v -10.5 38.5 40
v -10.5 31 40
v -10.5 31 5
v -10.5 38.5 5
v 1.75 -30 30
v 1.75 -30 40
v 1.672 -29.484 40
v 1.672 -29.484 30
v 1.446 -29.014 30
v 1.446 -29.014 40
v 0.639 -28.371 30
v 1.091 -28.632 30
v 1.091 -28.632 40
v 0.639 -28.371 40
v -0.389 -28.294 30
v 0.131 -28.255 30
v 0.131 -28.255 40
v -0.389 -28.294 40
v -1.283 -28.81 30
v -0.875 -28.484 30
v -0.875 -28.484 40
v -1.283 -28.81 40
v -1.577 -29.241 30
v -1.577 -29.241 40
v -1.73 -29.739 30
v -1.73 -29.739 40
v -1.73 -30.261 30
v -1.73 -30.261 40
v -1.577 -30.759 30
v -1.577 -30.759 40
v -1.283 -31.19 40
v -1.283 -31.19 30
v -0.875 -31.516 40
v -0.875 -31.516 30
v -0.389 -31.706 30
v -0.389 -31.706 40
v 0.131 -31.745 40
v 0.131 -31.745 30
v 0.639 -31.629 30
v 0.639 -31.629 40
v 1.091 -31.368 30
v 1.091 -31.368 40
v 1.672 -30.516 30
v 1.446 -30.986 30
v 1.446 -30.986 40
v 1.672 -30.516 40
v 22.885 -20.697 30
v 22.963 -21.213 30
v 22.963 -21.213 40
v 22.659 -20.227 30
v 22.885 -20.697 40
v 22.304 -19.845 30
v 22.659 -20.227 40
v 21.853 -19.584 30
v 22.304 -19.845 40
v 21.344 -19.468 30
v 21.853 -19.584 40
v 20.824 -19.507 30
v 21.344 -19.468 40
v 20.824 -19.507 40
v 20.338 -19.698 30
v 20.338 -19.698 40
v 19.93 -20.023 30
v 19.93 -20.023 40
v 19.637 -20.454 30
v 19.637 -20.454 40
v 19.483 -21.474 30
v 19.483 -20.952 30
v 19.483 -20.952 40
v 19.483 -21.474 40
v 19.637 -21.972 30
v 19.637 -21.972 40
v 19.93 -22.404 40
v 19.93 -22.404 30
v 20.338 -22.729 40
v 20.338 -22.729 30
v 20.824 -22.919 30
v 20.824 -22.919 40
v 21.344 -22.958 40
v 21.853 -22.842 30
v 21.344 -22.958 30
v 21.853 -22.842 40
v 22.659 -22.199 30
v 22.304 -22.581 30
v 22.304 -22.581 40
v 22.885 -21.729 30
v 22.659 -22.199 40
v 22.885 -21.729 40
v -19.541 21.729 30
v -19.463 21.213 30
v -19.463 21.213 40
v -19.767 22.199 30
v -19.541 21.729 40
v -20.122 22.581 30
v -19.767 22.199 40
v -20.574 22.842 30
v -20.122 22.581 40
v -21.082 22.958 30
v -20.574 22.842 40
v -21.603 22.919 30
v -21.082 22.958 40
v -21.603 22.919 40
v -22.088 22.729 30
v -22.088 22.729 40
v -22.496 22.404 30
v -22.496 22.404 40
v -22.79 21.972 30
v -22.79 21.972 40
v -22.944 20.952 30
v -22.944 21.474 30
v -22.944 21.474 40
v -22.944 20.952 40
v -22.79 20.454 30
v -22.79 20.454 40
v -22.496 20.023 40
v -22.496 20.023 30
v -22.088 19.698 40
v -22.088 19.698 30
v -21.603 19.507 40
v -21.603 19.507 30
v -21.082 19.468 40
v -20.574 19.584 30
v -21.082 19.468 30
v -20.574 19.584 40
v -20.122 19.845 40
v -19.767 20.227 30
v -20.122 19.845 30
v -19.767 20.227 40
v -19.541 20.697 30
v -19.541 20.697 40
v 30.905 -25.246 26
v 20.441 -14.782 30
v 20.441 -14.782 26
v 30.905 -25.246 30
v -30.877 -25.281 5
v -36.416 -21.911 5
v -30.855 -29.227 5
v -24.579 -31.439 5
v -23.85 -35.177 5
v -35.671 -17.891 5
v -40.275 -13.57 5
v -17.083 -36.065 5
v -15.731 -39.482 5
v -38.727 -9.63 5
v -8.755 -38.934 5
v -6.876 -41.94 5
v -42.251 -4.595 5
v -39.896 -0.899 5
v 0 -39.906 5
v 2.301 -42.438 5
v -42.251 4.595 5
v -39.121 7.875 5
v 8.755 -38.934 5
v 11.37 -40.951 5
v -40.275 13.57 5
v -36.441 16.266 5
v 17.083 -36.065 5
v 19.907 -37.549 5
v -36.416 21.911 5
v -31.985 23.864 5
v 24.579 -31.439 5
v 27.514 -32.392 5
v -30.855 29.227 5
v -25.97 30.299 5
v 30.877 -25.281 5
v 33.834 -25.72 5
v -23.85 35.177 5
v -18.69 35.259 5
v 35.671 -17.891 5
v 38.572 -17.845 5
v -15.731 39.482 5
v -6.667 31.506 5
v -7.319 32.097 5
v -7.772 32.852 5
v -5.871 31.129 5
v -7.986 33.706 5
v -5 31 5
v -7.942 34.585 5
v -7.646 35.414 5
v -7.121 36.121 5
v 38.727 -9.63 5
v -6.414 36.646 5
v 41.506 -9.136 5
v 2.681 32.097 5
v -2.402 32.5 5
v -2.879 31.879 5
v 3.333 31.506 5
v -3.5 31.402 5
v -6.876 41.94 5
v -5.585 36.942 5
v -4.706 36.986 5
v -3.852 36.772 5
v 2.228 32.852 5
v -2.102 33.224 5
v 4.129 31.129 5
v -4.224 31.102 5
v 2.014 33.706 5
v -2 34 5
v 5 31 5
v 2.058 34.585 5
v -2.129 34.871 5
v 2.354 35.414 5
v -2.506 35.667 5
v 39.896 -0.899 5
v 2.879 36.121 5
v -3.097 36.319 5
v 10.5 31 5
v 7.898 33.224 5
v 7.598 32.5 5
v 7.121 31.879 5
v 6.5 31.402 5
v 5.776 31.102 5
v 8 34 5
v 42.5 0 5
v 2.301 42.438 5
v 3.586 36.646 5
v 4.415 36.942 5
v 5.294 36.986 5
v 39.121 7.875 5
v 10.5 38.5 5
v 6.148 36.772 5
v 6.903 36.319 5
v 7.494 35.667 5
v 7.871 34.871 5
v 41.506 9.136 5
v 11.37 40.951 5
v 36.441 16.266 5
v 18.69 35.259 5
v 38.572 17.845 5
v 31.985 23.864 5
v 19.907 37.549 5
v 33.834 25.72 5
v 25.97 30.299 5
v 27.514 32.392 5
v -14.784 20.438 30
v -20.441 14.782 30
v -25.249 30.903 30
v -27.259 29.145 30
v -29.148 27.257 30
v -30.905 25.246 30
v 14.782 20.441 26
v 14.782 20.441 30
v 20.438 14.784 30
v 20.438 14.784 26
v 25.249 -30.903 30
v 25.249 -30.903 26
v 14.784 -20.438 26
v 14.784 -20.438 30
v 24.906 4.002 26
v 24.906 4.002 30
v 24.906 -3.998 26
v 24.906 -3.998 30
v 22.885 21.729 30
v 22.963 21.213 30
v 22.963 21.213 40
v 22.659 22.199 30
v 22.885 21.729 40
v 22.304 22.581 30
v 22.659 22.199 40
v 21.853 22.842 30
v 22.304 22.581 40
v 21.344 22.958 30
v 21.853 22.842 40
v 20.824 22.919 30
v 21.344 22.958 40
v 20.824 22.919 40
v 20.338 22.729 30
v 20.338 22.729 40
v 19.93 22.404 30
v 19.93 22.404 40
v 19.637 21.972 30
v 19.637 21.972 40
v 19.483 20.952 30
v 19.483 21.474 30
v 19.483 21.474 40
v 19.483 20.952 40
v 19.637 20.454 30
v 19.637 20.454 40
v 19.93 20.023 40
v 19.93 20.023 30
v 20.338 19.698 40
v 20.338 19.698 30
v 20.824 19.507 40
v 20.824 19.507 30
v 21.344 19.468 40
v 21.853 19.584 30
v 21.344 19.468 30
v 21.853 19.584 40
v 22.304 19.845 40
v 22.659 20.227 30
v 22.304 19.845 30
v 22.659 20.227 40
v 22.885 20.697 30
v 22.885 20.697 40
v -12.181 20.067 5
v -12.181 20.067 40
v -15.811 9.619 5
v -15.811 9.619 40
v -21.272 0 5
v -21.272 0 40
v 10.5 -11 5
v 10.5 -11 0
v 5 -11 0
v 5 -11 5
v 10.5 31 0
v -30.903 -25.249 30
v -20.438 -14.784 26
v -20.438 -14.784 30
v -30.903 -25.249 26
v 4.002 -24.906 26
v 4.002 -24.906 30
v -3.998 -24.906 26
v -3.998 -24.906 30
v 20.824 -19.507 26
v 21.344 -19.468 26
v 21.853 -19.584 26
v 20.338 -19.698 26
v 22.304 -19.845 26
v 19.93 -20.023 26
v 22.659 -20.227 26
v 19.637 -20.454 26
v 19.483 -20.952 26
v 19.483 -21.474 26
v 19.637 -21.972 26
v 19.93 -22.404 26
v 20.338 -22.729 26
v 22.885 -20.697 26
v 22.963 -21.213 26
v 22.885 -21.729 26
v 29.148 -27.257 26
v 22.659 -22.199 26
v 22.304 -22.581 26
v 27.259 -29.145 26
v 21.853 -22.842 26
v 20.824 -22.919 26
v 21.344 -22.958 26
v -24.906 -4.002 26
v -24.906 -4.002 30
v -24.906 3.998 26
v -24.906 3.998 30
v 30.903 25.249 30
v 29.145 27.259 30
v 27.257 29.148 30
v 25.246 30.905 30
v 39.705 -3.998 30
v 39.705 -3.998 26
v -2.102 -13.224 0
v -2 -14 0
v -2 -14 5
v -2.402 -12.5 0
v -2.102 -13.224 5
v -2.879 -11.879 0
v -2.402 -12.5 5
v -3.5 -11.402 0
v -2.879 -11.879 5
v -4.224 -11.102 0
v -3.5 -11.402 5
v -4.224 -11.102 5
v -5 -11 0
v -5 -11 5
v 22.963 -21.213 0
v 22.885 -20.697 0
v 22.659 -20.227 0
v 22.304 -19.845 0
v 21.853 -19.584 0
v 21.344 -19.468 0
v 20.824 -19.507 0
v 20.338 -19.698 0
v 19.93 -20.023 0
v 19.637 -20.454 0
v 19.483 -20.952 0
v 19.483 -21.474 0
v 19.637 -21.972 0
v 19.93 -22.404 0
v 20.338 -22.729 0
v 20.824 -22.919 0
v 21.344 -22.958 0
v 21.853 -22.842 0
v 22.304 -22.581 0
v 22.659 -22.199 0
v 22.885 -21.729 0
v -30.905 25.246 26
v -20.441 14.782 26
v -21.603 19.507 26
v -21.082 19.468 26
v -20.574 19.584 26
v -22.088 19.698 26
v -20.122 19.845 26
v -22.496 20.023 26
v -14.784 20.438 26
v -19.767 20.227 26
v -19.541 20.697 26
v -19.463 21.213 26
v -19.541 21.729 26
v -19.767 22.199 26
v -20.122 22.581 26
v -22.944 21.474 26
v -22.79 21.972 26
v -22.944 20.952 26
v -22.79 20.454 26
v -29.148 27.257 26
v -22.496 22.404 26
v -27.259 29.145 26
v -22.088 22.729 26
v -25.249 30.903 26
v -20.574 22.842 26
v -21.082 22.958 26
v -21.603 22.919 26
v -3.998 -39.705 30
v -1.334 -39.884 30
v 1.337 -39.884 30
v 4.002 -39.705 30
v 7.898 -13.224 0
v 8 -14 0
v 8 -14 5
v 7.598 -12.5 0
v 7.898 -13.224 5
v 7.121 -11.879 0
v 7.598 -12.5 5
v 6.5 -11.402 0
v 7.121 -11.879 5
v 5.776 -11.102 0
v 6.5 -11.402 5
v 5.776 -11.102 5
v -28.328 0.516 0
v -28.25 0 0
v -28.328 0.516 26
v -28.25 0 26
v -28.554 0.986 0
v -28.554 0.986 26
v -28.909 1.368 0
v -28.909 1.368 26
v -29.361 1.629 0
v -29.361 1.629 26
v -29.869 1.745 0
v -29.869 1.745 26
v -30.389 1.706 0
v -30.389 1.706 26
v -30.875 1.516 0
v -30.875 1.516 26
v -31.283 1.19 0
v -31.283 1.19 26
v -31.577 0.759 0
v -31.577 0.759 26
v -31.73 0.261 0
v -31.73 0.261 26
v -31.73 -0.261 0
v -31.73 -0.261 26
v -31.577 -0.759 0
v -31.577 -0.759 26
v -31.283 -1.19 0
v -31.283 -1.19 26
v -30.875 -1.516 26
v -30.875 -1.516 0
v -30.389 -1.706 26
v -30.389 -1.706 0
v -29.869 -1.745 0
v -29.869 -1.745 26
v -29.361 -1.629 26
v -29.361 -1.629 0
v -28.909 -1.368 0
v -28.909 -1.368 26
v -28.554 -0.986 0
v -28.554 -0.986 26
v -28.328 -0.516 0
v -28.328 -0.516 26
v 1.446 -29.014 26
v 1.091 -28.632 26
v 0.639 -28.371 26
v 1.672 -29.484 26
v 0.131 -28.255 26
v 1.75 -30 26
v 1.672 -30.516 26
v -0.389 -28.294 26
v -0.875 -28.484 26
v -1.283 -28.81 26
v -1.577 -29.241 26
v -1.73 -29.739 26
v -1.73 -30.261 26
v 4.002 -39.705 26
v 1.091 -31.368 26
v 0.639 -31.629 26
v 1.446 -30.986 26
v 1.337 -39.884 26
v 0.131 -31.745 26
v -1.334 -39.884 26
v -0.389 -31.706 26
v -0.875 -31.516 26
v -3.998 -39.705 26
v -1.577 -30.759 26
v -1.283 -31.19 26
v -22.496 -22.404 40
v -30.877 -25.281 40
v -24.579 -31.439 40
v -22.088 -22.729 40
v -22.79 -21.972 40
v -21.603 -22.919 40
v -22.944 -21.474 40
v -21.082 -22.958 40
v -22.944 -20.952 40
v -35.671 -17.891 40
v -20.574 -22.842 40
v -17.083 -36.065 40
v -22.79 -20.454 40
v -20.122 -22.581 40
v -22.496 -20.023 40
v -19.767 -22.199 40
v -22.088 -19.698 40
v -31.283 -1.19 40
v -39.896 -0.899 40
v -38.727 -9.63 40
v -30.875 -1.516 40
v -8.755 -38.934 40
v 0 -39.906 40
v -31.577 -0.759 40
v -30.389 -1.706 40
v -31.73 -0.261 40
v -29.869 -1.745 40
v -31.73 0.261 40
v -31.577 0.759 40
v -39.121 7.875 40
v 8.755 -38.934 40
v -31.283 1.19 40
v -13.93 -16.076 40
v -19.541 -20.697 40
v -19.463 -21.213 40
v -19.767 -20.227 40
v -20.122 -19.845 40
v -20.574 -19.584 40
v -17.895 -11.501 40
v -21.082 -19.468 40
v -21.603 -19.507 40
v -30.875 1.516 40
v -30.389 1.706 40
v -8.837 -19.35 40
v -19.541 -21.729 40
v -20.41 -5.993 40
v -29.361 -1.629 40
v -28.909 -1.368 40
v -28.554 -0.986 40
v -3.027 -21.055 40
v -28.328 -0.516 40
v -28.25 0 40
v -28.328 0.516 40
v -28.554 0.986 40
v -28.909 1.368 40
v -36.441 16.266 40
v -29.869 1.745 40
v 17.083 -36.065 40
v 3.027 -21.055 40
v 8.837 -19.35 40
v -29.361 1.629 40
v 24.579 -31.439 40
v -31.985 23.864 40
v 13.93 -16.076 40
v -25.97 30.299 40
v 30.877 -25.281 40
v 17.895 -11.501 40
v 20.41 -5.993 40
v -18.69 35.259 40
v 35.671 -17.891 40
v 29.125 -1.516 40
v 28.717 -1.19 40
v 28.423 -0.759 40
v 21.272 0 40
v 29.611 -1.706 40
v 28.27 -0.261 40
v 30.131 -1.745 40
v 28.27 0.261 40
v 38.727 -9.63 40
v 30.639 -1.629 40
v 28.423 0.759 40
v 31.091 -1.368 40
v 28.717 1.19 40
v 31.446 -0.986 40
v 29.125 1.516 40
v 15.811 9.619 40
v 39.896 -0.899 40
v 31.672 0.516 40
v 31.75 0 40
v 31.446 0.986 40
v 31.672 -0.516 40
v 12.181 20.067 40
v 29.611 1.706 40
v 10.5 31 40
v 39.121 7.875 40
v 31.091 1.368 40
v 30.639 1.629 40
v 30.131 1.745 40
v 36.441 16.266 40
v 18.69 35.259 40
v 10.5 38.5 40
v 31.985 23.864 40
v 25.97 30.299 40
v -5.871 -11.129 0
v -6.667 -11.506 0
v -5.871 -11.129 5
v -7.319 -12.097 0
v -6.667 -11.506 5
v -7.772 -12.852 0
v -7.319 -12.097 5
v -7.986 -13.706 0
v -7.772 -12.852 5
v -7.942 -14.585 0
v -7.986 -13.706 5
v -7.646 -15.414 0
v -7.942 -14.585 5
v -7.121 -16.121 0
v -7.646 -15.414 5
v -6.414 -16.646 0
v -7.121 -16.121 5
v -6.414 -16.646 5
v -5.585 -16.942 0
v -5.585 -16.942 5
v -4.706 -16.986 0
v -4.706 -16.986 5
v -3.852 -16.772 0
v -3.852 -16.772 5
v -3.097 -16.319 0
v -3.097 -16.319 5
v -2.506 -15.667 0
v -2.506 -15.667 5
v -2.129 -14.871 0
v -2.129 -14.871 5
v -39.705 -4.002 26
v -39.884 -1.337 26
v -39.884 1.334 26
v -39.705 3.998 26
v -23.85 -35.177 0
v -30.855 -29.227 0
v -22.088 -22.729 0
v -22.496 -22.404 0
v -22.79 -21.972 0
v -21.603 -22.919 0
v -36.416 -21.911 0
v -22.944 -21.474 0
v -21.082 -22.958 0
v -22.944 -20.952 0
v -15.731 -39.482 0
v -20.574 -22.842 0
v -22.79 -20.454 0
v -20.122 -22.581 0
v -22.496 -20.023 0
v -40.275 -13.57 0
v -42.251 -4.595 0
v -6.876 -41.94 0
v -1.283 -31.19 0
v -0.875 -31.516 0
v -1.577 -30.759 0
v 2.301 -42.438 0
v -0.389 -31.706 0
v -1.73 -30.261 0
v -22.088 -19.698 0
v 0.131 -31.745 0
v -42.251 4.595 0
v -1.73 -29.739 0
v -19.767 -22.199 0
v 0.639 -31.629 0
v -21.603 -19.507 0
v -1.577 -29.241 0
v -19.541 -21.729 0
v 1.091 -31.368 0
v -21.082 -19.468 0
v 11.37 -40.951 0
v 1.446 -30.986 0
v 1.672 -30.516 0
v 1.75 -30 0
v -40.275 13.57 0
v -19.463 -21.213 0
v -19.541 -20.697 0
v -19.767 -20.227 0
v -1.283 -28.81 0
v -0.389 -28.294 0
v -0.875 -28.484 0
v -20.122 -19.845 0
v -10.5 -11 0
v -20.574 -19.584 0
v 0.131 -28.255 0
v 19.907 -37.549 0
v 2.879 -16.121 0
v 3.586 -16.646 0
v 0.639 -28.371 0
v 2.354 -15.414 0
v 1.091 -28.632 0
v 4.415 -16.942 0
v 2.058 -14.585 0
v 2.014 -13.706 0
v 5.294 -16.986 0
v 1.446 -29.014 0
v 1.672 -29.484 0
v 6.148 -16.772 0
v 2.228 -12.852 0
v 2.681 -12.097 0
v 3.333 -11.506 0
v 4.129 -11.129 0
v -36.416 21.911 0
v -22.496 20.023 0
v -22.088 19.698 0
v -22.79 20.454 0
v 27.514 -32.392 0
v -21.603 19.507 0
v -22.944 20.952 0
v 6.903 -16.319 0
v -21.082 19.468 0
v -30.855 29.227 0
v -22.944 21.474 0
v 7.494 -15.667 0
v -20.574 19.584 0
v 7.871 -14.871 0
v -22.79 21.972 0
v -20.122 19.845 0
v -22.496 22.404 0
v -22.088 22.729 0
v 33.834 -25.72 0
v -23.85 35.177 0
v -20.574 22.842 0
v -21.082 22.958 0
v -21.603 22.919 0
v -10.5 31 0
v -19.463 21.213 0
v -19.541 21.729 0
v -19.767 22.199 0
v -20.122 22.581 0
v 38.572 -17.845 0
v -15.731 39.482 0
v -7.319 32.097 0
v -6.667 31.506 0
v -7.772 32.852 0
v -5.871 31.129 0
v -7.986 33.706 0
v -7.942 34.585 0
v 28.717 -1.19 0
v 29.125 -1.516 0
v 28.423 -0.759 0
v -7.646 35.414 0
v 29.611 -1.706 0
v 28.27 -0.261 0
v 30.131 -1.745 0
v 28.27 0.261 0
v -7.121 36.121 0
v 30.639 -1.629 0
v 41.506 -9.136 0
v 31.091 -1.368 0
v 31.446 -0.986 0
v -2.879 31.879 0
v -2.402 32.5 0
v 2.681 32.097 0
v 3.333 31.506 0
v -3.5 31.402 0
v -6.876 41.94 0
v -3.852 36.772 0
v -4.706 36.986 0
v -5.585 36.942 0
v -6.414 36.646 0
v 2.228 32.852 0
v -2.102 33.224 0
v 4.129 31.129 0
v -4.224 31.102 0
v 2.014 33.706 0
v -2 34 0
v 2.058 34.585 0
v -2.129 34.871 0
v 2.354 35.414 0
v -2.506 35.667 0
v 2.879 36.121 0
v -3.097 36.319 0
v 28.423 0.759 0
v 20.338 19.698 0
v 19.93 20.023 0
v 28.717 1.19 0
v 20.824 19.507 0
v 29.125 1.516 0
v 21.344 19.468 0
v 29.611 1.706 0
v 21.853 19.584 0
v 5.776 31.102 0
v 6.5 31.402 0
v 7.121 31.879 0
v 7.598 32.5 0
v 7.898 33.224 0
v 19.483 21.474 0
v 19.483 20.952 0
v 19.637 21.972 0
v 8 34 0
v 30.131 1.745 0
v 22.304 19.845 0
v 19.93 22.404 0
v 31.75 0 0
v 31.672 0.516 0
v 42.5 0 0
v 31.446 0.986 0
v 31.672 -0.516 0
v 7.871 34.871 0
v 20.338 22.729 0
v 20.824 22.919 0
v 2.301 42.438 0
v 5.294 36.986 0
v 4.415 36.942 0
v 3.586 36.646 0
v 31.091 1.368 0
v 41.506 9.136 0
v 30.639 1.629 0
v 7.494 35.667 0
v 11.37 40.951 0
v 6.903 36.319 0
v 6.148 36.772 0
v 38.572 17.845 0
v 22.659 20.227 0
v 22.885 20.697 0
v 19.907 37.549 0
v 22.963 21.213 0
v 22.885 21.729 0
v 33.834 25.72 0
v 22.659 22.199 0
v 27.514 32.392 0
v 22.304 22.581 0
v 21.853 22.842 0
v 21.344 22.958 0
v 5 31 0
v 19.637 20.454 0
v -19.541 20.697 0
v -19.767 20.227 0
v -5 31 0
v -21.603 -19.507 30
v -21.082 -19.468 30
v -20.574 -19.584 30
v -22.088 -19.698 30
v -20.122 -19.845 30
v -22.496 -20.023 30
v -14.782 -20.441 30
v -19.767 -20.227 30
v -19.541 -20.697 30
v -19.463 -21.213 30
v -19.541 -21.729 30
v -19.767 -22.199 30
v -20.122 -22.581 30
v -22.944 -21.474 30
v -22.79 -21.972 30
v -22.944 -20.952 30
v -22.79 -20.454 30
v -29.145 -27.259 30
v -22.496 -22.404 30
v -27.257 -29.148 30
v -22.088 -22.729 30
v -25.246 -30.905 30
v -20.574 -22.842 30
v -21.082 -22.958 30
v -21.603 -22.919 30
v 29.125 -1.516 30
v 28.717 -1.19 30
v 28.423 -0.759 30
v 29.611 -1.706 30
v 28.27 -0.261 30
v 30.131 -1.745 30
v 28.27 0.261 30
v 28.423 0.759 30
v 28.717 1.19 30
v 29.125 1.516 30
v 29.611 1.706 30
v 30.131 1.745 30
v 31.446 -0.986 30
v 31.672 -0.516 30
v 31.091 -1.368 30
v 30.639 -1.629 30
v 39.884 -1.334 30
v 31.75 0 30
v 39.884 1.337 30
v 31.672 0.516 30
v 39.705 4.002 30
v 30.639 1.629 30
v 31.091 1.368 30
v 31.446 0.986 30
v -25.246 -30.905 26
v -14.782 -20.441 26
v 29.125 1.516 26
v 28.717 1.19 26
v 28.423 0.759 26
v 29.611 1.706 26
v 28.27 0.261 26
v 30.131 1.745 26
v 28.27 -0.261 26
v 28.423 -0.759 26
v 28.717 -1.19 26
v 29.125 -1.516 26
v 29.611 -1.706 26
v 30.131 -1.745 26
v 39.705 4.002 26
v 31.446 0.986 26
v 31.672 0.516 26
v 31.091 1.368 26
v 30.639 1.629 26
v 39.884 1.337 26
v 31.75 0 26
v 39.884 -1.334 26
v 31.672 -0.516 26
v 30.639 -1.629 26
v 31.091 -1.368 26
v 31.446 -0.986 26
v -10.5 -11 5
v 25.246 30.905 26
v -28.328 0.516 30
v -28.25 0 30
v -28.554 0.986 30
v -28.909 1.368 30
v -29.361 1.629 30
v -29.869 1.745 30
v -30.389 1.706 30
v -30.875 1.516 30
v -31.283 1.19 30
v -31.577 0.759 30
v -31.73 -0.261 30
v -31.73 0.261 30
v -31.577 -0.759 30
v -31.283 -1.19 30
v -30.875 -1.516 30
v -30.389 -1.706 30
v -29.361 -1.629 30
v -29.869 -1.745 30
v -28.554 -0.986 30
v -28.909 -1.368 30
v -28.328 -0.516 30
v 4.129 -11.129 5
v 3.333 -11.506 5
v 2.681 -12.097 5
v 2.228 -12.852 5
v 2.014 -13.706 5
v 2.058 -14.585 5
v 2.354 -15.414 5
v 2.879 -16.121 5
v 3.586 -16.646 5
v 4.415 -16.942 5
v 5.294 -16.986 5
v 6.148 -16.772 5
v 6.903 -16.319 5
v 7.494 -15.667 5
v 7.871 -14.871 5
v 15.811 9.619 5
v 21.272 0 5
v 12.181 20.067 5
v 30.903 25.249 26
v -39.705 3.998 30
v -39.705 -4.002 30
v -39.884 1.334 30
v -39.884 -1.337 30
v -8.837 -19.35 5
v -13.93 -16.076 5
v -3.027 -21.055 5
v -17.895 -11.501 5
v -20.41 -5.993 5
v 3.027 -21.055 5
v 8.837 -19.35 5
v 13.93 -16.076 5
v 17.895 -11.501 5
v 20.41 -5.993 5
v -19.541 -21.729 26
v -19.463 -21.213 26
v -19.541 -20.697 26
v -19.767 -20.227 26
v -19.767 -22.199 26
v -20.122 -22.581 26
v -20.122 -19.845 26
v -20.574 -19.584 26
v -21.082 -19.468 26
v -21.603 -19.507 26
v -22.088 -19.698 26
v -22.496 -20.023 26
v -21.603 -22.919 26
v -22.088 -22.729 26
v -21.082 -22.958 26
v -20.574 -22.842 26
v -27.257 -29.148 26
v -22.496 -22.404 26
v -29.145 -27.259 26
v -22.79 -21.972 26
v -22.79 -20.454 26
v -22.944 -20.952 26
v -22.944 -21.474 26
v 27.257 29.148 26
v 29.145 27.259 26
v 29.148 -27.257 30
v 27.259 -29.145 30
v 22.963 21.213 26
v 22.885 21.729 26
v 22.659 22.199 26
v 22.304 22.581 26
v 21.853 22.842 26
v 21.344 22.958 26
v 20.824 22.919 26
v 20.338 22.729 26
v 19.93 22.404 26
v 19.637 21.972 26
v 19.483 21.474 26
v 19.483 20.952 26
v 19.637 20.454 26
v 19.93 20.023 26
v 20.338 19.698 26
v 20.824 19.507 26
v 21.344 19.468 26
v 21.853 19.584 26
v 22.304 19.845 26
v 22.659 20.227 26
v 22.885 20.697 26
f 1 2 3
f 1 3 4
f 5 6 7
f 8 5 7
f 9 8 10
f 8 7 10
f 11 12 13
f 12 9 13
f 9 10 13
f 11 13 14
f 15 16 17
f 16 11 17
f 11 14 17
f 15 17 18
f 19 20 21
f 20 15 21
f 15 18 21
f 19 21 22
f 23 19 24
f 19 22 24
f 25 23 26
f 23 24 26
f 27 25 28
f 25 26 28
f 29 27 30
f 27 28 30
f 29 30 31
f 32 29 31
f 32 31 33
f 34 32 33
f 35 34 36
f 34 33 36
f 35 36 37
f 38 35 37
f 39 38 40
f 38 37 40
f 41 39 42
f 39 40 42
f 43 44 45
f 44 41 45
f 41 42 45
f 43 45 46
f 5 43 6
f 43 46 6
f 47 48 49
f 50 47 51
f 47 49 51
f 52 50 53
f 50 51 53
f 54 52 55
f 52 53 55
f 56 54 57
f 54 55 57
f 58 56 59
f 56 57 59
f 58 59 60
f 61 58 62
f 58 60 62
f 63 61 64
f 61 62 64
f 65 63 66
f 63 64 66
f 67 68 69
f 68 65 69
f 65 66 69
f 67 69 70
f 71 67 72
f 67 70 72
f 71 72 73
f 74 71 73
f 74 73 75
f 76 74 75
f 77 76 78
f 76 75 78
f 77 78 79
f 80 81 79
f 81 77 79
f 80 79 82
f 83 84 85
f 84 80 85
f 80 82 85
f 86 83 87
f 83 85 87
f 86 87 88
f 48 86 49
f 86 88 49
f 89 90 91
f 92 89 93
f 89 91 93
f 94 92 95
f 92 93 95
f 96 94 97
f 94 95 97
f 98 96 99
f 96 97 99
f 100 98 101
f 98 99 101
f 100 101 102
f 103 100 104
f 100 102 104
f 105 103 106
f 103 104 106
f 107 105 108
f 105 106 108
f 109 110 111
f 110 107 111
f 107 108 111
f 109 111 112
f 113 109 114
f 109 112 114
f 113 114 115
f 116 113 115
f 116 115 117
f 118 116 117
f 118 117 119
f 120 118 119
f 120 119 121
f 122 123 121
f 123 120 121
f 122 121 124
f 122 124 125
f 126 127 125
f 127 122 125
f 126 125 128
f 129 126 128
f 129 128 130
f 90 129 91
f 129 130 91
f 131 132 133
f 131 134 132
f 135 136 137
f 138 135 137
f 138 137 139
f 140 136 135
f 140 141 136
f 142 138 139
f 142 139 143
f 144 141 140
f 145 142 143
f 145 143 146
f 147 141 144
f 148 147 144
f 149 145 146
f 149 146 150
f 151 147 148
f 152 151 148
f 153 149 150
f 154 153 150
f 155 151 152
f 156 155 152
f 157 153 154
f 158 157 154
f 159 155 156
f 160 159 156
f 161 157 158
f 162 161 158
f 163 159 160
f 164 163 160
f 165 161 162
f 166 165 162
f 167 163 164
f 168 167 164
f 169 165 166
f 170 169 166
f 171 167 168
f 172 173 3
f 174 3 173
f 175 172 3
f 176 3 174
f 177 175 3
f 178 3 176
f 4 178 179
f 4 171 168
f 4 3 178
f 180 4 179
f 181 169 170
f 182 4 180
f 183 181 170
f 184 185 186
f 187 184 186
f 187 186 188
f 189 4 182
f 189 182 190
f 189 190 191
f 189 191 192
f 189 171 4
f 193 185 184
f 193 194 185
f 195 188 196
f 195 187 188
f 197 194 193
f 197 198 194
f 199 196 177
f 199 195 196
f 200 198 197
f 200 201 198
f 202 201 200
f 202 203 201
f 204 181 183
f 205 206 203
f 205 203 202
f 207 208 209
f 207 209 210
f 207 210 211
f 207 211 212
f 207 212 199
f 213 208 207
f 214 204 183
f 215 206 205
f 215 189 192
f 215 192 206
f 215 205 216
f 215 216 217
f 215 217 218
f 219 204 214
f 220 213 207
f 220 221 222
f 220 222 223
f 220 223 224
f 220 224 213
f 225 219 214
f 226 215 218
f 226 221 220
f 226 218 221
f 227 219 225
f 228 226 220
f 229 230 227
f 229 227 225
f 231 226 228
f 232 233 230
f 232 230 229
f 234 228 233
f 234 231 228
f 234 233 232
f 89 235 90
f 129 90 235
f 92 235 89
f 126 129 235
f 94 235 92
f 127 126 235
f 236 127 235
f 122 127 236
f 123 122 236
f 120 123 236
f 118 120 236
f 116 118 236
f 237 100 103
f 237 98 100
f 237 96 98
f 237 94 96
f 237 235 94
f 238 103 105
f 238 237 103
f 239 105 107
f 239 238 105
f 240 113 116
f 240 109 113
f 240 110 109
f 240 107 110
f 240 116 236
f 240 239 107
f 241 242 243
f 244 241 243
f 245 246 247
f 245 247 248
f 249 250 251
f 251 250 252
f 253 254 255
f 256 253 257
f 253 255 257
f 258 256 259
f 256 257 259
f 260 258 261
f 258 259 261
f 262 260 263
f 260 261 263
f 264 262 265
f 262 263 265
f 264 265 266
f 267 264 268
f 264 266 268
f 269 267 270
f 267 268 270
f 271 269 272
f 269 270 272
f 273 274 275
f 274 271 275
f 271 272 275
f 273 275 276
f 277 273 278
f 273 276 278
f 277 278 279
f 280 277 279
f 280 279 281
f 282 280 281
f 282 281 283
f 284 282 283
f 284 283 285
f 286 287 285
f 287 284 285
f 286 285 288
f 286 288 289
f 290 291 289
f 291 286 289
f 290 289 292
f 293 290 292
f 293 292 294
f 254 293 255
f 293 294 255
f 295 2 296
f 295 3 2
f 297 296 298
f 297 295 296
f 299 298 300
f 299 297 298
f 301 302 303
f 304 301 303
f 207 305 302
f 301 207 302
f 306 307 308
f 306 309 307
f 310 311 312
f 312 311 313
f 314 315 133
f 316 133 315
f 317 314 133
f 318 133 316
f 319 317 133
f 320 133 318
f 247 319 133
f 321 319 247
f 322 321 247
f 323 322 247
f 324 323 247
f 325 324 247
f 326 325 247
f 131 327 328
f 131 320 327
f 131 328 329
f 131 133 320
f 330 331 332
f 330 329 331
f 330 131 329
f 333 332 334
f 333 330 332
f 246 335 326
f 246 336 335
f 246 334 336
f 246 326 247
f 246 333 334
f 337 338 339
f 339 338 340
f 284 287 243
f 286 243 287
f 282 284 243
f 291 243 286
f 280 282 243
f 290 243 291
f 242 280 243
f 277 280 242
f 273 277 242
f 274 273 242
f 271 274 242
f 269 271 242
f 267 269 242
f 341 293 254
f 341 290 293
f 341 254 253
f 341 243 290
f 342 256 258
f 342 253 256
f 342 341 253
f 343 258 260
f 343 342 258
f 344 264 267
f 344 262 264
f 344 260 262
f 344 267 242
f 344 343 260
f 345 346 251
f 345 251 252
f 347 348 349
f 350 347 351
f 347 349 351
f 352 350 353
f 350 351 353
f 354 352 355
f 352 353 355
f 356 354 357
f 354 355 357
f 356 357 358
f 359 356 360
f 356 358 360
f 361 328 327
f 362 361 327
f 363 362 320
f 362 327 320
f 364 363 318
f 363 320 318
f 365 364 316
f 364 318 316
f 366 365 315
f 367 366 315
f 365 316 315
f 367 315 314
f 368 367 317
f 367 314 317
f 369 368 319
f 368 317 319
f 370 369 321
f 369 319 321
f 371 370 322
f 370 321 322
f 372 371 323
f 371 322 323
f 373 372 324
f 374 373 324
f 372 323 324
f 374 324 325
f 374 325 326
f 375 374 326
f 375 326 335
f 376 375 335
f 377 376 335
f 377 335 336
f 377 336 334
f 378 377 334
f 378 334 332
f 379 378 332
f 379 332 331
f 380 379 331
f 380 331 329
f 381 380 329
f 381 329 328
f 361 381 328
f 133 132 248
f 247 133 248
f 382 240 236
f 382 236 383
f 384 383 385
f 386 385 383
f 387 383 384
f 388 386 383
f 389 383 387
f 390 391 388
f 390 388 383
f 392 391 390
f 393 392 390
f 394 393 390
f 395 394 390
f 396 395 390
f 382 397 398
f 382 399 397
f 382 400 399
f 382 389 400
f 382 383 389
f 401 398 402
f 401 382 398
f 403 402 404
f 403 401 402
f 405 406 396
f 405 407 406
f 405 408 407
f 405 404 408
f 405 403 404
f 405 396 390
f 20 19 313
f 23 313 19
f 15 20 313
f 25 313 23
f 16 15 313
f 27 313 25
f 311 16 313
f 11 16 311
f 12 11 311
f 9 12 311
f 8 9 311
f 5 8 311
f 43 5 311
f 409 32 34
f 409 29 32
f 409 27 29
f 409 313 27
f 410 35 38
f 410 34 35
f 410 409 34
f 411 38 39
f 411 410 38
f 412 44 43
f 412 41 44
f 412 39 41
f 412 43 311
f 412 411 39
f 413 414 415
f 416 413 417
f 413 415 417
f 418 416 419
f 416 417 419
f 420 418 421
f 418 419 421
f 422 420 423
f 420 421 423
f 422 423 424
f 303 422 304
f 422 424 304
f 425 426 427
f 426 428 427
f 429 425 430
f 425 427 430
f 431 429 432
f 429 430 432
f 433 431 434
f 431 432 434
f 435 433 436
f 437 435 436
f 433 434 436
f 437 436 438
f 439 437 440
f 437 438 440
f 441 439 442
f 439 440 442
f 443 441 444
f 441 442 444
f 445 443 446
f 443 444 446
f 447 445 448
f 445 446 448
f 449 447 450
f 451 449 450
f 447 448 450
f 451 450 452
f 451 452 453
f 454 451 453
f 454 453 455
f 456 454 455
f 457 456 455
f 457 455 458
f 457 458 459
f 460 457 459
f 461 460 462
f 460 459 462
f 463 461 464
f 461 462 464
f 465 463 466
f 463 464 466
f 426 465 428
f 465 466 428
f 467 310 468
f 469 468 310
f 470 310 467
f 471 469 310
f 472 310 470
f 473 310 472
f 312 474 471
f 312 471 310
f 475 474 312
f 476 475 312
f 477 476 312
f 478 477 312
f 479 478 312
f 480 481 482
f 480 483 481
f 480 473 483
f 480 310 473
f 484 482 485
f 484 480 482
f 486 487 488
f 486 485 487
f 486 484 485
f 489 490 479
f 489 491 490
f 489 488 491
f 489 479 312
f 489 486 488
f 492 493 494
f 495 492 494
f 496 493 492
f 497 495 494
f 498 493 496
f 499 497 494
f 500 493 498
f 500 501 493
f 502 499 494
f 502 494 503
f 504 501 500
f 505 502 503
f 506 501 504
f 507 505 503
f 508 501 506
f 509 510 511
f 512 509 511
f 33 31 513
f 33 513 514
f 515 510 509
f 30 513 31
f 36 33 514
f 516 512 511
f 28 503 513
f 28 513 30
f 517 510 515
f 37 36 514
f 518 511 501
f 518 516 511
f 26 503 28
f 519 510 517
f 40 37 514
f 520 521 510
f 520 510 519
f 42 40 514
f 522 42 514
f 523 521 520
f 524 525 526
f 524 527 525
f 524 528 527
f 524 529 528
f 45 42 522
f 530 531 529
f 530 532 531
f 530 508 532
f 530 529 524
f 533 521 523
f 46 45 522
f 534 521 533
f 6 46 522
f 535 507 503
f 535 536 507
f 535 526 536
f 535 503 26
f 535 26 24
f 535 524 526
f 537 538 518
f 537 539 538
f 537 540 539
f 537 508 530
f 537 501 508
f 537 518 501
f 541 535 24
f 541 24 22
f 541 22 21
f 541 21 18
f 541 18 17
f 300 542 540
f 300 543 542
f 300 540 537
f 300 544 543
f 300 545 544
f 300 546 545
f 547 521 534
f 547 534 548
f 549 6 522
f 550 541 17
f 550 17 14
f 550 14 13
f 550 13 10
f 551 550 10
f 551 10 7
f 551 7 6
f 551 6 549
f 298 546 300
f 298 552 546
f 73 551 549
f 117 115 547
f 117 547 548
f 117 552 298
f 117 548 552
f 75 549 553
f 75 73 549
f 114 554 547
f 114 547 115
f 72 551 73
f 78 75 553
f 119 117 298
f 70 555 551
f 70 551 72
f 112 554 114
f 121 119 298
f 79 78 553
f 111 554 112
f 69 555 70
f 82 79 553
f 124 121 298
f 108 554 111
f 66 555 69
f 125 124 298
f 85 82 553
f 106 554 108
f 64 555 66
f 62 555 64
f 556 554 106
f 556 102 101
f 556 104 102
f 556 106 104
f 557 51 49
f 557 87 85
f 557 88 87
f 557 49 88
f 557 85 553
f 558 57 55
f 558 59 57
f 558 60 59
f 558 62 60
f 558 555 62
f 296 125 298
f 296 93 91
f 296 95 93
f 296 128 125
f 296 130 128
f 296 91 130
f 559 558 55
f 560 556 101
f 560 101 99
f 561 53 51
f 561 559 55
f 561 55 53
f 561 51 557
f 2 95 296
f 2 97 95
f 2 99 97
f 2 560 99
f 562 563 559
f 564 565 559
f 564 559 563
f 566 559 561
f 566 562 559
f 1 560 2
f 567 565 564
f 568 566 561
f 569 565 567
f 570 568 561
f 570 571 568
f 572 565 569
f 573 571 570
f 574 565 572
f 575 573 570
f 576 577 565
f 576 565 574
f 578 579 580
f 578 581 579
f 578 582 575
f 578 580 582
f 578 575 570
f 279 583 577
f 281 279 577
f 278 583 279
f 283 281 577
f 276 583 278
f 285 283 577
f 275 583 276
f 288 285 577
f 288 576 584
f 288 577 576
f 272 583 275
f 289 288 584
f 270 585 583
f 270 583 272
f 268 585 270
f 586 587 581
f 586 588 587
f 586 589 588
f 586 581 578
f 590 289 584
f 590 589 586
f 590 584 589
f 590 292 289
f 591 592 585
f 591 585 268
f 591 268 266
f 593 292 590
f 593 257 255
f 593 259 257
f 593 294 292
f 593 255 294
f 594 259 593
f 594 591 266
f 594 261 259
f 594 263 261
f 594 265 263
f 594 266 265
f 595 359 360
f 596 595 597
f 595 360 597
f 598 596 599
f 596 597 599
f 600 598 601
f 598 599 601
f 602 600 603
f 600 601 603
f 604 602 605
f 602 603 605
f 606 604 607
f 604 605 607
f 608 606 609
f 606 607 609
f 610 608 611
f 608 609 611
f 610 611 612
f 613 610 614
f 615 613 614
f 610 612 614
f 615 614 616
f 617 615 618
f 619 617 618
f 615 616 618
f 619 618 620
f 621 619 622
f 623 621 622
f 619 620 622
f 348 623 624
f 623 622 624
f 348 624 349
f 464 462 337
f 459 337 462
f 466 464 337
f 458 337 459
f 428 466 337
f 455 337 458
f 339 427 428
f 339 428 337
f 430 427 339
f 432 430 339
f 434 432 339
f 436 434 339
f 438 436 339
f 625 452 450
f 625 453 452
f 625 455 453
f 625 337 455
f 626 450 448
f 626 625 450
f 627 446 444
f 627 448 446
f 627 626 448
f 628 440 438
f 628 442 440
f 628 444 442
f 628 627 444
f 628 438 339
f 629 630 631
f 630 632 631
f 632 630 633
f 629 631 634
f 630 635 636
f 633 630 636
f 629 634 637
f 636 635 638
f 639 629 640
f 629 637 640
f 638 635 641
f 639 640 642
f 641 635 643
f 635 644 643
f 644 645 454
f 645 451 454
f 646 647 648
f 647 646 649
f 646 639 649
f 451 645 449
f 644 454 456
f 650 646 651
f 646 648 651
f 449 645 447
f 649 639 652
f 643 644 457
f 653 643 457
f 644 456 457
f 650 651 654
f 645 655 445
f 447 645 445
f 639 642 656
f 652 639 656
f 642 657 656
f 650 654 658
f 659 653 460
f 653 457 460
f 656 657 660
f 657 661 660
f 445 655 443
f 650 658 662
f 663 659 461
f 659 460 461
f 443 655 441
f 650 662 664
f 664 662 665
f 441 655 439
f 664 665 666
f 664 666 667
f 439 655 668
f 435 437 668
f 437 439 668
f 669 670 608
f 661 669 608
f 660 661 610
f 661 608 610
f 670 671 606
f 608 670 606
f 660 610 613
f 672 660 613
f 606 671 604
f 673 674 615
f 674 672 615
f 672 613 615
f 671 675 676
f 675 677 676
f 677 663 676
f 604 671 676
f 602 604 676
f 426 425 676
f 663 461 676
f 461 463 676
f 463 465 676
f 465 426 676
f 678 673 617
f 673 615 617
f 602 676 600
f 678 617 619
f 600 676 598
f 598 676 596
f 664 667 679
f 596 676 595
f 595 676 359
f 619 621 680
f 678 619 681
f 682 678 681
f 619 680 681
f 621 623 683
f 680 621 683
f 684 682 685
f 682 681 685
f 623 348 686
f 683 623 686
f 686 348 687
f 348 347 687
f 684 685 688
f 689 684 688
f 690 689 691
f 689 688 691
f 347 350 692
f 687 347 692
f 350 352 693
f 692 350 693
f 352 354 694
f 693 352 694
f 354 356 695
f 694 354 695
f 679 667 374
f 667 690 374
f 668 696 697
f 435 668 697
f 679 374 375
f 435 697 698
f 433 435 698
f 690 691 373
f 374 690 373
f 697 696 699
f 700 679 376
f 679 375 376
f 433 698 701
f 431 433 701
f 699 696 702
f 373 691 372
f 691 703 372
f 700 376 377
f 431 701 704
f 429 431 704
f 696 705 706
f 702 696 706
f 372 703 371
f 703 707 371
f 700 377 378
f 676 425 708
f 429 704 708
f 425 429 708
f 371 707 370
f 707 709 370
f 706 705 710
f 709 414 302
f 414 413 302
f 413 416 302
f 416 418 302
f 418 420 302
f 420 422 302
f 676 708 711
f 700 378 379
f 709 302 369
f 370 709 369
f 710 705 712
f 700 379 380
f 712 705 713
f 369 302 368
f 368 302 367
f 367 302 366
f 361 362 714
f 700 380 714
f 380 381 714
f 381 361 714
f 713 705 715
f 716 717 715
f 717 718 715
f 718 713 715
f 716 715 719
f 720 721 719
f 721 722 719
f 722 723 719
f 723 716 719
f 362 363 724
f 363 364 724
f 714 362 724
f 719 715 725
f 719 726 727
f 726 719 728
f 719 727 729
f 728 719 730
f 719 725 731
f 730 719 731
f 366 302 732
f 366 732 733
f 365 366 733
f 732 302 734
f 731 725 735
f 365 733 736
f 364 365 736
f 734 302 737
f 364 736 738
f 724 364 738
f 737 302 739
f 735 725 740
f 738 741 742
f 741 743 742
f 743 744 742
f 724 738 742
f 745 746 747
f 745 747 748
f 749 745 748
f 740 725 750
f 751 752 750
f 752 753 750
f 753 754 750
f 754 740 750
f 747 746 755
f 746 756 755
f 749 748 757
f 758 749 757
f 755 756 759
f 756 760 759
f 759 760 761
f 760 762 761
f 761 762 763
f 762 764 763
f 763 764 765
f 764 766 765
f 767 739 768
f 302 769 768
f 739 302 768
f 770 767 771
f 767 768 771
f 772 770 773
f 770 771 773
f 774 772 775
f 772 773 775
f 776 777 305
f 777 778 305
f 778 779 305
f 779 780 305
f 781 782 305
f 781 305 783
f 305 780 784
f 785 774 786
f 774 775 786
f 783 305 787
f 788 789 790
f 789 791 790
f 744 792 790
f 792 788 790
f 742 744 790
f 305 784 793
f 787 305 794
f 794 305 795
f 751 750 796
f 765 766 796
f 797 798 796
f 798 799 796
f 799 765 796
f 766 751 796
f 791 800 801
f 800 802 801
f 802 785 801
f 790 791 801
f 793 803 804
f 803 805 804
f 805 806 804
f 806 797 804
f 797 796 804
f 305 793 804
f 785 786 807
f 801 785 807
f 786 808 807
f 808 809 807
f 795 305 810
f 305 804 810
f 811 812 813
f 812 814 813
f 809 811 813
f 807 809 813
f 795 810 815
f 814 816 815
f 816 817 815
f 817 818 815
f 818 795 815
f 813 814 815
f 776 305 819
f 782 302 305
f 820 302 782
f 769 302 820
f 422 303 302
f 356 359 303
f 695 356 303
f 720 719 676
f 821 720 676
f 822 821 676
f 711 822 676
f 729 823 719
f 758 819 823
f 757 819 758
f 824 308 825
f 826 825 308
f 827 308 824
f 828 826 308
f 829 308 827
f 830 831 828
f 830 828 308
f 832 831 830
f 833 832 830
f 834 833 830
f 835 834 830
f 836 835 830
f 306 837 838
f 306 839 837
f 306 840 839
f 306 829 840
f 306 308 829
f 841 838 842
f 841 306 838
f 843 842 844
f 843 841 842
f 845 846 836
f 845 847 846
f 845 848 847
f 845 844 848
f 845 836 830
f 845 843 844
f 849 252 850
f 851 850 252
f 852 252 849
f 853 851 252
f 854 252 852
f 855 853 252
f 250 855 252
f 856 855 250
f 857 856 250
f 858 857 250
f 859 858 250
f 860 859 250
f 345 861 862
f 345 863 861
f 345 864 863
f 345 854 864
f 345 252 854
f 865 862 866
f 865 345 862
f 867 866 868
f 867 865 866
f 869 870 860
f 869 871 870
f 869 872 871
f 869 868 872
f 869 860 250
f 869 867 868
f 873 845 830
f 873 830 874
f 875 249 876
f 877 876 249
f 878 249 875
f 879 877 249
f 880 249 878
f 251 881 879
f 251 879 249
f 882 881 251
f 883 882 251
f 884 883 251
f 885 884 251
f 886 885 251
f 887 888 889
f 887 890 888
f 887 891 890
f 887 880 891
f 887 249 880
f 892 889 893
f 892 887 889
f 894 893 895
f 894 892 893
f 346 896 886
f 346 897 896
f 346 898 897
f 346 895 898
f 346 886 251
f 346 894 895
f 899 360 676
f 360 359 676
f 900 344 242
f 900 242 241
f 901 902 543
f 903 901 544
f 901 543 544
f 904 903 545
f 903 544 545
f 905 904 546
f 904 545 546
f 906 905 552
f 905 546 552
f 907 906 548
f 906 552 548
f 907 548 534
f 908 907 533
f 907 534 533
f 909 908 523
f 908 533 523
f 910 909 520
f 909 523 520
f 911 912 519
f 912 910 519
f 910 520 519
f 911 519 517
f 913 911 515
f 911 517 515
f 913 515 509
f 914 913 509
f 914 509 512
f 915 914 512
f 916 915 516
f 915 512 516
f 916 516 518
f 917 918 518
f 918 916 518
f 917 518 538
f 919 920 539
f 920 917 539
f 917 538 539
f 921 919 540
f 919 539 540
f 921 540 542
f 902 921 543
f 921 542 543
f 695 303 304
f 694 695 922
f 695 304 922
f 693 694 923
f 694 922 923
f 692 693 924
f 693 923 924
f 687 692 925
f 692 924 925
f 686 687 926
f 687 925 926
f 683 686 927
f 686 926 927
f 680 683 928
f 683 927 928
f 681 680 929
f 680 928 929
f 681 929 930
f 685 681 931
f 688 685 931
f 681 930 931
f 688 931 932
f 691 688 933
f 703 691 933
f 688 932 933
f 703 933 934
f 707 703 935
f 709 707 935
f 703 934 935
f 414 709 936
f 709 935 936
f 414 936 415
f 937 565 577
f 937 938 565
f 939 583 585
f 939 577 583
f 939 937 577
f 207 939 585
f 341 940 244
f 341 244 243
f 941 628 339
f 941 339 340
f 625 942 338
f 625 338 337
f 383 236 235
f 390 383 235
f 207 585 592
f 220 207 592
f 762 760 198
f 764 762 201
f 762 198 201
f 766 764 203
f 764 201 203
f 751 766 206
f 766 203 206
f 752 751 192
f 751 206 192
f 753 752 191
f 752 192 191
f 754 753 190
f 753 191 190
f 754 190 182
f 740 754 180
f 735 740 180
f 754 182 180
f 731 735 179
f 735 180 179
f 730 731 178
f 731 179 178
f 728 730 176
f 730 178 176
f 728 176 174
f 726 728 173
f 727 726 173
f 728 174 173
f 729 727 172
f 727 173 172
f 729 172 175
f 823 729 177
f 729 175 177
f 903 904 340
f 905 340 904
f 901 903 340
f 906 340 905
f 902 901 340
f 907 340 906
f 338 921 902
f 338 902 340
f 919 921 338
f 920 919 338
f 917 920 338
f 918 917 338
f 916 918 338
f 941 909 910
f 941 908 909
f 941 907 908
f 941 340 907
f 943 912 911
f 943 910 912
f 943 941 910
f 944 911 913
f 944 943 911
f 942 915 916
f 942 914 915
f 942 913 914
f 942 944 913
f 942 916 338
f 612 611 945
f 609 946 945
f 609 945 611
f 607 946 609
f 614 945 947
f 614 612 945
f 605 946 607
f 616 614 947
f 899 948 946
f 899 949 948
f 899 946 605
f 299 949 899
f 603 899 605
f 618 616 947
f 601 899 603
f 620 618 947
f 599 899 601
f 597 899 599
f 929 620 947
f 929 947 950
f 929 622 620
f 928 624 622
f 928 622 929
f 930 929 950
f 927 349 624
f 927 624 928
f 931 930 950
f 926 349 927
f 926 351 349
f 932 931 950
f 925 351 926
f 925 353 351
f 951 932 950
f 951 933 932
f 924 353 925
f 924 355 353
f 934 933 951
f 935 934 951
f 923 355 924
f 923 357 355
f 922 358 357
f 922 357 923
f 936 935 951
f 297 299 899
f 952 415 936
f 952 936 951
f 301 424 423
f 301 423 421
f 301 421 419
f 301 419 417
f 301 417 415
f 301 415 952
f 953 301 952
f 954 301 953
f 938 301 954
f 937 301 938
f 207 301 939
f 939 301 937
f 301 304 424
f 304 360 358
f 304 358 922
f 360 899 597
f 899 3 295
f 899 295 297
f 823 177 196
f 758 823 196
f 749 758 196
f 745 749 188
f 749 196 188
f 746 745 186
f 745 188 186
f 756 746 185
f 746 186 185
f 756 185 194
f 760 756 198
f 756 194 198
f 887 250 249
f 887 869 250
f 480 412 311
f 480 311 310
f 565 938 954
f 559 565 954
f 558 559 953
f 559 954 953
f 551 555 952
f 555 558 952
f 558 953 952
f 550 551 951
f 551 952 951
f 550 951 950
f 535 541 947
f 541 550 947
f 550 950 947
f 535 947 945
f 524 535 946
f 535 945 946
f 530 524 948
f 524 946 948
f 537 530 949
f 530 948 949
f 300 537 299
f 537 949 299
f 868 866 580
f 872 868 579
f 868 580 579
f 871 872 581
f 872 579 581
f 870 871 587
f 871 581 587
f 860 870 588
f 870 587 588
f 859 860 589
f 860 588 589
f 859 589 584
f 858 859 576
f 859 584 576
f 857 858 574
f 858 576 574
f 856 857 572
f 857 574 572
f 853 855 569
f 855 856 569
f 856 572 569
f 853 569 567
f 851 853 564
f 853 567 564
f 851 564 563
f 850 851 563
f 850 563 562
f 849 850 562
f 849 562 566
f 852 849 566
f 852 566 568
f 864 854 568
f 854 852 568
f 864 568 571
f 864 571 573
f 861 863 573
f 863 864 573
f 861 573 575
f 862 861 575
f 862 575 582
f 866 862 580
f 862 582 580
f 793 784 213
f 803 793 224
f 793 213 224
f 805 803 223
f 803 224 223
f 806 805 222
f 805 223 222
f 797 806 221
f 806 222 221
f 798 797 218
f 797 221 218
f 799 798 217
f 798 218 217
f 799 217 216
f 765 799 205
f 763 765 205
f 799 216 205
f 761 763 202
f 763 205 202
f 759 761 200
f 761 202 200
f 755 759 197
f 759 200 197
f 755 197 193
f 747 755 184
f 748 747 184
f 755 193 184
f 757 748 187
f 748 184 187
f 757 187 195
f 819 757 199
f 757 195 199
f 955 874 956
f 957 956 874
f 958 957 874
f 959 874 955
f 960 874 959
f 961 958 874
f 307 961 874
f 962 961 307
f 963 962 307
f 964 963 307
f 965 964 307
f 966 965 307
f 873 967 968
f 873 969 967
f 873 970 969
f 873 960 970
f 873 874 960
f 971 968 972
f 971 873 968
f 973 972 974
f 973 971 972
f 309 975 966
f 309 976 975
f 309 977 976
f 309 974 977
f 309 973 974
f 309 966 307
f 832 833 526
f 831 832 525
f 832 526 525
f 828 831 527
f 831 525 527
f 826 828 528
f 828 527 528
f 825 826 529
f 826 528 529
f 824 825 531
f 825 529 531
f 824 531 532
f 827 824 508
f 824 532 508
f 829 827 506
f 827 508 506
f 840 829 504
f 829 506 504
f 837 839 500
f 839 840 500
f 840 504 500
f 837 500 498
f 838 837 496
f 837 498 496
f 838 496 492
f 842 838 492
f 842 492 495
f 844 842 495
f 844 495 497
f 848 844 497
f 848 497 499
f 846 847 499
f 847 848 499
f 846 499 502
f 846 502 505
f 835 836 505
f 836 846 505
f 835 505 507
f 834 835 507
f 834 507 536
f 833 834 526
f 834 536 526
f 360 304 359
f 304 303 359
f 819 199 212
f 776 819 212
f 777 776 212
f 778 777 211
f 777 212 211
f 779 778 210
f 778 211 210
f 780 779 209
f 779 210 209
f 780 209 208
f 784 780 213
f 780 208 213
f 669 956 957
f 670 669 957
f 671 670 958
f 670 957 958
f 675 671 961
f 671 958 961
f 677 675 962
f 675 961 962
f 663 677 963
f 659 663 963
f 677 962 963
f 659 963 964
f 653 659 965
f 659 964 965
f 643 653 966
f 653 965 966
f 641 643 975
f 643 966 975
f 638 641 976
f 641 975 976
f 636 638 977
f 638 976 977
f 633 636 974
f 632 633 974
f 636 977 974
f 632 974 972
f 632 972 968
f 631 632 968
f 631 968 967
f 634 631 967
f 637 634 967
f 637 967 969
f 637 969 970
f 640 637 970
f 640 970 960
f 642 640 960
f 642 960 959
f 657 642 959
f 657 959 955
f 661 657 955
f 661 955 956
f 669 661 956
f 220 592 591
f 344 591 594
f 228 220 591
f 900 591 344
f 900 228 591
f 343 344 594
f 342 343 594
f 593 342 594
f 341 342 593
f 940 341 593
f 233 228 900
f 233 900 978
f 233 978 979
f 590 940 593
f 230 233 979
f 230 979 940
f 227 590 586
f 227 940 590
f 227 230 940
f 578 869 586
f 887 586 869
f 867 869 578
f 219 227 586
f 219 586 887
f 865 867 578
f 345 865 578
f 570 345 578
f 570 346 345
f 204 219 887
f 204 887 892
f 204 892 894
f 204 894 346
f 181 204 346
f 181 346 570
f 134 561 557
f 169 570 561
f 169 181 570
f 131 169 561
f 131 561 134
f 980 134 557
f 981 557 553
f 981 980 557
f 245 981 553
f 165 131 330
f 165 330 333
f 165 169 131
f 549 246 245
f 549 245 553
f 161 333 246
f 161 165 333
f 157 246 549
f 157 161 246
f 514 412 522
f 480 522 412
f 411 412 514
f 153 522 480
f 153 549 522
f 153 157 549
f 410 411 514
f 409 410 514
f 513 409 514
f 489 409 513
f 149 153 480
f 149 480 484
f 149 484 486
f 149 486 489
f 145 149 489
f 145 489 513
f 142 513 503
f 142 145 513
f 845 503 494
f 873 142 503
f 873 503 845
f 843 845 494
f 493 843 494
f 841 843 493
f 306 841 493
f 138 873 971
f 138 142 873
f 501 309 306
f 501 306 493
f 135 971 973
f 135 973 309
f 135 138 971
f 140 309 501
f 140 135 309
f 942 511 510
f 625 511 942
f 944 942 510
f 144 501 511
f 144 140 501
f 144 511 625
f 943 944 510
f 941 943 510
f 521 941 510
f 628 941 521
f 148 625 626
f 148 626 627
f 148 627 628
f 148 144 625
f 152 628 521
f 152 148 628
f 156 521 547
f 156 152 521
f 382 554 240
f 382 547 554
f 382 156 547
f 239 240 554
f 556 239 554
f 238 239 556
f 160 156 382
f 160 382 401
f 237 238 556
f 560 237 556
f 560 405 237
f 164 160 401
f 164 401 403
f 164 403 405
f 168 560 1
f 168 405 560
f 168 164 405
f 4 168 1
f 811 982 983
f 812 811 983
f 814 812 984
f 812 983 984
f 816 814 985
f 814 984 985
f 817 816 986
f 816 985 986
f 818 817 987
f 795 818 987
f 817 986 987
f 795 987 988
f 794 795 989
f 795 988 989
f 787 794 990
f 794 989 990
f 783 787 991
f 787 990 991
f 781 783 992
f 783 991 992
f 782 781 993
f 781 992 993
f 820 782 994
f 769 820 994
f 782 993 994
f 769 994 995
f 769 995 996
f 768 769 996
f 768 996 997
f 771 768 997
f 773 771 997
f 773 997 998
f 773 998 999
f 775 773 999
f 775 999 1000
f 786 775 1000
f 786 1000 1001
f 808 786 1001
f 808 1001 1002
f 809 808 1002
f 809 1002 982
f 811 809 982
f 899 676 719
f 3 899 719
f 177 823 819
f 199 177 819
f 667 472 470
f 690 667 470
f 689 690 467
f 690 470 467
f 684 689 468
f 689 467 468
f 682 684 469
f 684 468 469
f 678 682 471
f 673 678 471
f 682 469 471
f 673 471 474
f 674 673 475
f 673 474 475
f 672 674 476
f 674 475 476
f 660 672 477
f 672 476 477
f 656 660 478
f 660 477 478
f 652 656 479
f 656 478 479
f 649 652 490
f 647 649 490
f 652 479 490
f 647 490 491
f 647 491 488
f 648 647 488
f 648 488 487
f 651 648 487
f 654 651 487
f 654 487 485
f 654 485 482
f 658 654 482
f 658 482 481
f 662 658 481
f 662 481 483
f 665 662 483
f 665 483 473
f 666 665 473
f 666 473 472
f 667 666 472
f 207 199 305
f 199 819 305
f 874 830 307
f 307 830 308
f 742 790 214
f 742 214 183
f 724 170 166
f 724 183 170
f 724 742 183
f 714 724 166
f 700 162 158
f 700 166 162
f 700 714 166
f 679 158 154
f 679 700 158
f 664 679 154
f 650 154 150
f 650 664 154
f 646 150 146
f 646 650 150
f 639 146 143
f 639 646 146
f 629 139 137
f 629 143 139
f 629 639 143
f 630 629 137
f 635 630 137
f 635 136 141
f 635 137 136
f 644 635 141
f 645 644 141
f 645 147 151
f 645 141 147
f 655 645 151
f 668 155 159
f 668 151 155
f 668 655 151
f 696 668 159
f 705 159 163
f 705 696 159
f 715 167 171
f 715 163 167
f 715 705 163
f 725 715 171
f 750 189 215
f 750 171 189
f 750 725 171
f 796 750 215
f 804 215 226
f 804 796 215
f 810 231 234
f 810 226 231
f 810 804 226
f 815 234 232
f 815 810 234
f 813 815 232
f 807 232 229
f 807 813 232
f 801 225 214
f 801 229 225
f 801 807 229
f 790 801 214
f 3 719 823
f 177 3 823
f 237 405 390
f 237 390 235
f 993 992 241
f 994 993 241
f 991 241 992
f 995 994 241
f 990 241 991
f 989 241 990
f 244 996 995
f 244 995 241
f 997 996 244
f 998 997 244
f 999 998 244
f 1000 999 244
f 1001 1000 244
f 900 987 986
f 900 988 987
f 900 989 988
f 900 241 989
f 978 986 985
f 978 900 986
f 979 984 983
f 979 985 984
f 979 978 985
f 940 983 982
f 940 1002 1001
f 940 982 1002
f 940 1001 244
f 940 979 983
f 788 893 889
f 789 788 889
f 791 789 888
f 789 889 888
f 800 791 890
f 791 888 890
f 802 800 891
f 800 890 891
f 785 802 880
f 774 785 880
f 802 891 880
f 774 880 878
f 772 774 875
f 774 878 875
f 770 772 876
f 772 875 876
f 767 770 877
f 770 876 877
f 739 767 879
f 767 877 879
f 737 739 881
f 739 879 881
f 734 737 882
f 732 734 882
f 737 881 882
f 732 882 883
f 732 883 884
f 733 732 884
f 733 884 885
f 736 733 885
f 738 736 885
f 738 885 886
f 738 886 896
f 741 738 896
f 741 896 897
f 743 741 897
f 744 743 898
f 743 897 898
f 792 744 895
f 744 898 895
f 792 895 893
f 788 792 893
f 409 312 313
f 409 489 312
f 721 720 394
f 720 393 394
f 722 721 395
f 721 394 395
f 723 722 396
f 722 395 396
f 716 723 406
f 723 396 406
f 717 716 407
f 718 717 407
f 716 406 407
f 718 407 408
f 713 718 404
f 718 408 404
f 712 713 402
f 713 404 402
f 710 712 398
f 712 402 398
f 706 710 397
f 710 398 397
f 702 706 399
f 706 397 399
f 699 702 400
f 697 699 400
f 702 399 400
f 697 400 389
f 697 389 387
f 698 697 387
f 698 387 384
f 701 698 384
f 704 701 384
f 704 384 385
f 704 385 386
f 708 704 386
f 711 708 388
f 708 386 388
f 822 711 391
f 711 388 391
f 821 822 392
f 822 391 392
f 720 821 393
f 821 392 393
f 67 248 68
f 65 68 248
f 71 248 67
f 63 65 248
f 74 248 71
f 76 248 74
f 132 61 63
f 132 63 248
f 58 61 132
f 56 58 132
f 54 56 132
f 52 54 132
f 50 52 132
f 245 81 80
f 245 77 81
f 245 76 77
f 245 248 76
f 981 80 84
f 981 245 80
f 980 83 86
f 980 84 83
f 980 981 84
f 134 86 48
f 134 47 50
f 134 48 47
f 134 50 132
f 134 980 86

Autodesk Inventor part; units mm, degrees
ref_plane "YZ Plane" through (0, 0, 0) normal (1, 0, 0) x (0, 1, 0)
ref_plane "XY Plane" through (0, 0, 0) normal (0, 0, 1) x (1, 0, 0)
sketch "Sketch1" plane through (0, 0, 0) normal (0, 0, 1) x (1, 0, 0)
  line L0 (0, -11) -> (-10.5, -11)
  line L1 (-10.5, -11) -> (-10.5, 31)
  line L2 (-10.5, 31) -> (10.5, 31)
  line L3 (10.5, 31) -> (10.5, -11)
  line L4 (10.5, -11) -> (0, -11)
  line L5 (10.5, 10) -> (0, 10)
  line L6 (0, 0) -> (0, 10)
  circle A0 centre (0, 0) radius 42.5
  dimension "d1" = 42
  dimension "d28" = 21
  dimension "d76" = 10
  dimension "d77" = 10.5
  dimension "d78" = 85
extrude "Extrusion6" add sketch "Sketch1" along normal blind 5
sketch "Sketch9" plane through (0, 0, 5) normal (0, 0, 1) x (1, 0, 0)
  line L0 (10.5, -11) -> (-10.5, -11) projected
  line L1 (0, -11) -> (0, -14)
  line L2 (0, -14) -> (-5, -14)
  circle A0 centre (-5, -14) radius 3
  line L3 (0, -14) -> (5, -14)
  circle A1 centre (5, -14) radius 3
  line L4 (-10.5, -11) -> (-10.5, 31) projected
  line L5 (-10.5, 10) -> (10.5, 10)
  line L6 (10.5, 31) -> (-10.5, 31)
  line L7 (0, 31) -> (0, 34)
  line L8 (0, 34) -> (-5, 34)
  circle A2 centre (-5, 34) radius 3
  line L9 (0, 34) -> (5, 34)
  circle A3 centre (5, 34) radius 3
  dimension "d79" = 3
  dimension "d80" = 5
  dimension "d81" = 6
  dimension "d82" = 5
  dimension "d83" = 6
extrude "Extrusion12" cut sketch "Sketch9" against normal through all contours A2 | A1 | A0 | A3
sketch "Sketch10" plane through (0, 0, 5) normal (0, 0, 1) x (1, 0, 0)
  line L0 (-10.5, 31) -> (-10.5, 38.5)
  circle A0 centre (0, 0) radius 39.9061
  line L1 (-10.5, -11) -> (-10.5, -18.5)
  arc A1 (-21.272, 0) -> (21.272, 0) centre (0, 0) ccw
  arc A2 (-21.272, 0) -> (-10.5, 31) centre (-71.284, 34.75) ccw
  line L2 (10.5, 31) -> (10.5, 38.5)
  arc A3 (10.5, 31) -> (21.272, 0) centre (71.284, 34.75) ccw
  dimension "d86" = 7.5
  dimension "d87" = 79.8123
  dimension "d88" = 7.5
extrude "Extrusion13" add sketch "Sketch10" along normal blind 35 contours A2 A1 A3 L2 A0 L0 picked at (-28.5299, 15.6602)
sketch "Sketch11" plane through (0, 0, 40) normal (0, 0, 1) x (1, 0, 0)
  line L0 (0, 0) -> (0, -30)
  circle A0 centre (0, -30) radius 1.75
  circle A1 centre (21.2132, -21.2132) radius 1.75
  circle A2 centre (30, 0) radius 1.75
  circle A3 centre (21.2132, 21.2132) radius 1.75
  circle A4 centre (0, 30) radius 1.75
  circle A5 centre (-21.2132, 21.2132) radius 1.75
  circle A6 centre (-30, 0) radius 1.75
  circle A7 centre (-21.2132, -21.2132) radius 1.75
  dimension "d91" = 30
  dimension "d92" = 3.5
  dimension "d95" = 360
extrude "Extrusion14" cut sketch "Sketch11" against normal through all contours A0 | A1 | A2 | A3 | A5 | A6 | A7
sketch "Sketch12" plane through (0, 0, 40) normal (0, 0, 1) x (1, 0, 0)
  line L0 (0, 0) -> (0, -39.9061)
  arc A0 (-10.5, 38.5) -> (10.5, 38.5) centre (0, 0) ccw projected
ref_plane "Work Plane2" through (0, -39.9061, 40) normal (0, 1, 0) x (-1, 0, 0)
sketch "Sketch13" plane through (0, -39.9061, 40) normal (0, 1, 0) x (-1, 0, 0)
  line L0 (-0.0018, 0) -> (-0.0018, -10)
  line L1 (-0.0018, -10) -> (-4.0018, -10)
  line L2 (-4.0018, -10) -> (-4.0018, -14)
  line L3 (-4.0018, -14) -> (3.9982, -14)
  line L4 (3.9982, -14) -> (3.9982, -10)
  line L5 (3.9982, -10) -> (-0.0018, -10)
  point P0 (0, -40)
  dimension "d99" = 10
  dimension "d100" = 4
  dimension "d101" = 4
  dimension "d102" = 8
extrude "Extrusion15" cut sketch "Sketch13" along normal blind 15
pattern_circular "Circular Pattern2" count 8 over 360 about axis through (0, 0, 5) along (0, 0, 1) of "Extrusion15"
properties part number "Base"
